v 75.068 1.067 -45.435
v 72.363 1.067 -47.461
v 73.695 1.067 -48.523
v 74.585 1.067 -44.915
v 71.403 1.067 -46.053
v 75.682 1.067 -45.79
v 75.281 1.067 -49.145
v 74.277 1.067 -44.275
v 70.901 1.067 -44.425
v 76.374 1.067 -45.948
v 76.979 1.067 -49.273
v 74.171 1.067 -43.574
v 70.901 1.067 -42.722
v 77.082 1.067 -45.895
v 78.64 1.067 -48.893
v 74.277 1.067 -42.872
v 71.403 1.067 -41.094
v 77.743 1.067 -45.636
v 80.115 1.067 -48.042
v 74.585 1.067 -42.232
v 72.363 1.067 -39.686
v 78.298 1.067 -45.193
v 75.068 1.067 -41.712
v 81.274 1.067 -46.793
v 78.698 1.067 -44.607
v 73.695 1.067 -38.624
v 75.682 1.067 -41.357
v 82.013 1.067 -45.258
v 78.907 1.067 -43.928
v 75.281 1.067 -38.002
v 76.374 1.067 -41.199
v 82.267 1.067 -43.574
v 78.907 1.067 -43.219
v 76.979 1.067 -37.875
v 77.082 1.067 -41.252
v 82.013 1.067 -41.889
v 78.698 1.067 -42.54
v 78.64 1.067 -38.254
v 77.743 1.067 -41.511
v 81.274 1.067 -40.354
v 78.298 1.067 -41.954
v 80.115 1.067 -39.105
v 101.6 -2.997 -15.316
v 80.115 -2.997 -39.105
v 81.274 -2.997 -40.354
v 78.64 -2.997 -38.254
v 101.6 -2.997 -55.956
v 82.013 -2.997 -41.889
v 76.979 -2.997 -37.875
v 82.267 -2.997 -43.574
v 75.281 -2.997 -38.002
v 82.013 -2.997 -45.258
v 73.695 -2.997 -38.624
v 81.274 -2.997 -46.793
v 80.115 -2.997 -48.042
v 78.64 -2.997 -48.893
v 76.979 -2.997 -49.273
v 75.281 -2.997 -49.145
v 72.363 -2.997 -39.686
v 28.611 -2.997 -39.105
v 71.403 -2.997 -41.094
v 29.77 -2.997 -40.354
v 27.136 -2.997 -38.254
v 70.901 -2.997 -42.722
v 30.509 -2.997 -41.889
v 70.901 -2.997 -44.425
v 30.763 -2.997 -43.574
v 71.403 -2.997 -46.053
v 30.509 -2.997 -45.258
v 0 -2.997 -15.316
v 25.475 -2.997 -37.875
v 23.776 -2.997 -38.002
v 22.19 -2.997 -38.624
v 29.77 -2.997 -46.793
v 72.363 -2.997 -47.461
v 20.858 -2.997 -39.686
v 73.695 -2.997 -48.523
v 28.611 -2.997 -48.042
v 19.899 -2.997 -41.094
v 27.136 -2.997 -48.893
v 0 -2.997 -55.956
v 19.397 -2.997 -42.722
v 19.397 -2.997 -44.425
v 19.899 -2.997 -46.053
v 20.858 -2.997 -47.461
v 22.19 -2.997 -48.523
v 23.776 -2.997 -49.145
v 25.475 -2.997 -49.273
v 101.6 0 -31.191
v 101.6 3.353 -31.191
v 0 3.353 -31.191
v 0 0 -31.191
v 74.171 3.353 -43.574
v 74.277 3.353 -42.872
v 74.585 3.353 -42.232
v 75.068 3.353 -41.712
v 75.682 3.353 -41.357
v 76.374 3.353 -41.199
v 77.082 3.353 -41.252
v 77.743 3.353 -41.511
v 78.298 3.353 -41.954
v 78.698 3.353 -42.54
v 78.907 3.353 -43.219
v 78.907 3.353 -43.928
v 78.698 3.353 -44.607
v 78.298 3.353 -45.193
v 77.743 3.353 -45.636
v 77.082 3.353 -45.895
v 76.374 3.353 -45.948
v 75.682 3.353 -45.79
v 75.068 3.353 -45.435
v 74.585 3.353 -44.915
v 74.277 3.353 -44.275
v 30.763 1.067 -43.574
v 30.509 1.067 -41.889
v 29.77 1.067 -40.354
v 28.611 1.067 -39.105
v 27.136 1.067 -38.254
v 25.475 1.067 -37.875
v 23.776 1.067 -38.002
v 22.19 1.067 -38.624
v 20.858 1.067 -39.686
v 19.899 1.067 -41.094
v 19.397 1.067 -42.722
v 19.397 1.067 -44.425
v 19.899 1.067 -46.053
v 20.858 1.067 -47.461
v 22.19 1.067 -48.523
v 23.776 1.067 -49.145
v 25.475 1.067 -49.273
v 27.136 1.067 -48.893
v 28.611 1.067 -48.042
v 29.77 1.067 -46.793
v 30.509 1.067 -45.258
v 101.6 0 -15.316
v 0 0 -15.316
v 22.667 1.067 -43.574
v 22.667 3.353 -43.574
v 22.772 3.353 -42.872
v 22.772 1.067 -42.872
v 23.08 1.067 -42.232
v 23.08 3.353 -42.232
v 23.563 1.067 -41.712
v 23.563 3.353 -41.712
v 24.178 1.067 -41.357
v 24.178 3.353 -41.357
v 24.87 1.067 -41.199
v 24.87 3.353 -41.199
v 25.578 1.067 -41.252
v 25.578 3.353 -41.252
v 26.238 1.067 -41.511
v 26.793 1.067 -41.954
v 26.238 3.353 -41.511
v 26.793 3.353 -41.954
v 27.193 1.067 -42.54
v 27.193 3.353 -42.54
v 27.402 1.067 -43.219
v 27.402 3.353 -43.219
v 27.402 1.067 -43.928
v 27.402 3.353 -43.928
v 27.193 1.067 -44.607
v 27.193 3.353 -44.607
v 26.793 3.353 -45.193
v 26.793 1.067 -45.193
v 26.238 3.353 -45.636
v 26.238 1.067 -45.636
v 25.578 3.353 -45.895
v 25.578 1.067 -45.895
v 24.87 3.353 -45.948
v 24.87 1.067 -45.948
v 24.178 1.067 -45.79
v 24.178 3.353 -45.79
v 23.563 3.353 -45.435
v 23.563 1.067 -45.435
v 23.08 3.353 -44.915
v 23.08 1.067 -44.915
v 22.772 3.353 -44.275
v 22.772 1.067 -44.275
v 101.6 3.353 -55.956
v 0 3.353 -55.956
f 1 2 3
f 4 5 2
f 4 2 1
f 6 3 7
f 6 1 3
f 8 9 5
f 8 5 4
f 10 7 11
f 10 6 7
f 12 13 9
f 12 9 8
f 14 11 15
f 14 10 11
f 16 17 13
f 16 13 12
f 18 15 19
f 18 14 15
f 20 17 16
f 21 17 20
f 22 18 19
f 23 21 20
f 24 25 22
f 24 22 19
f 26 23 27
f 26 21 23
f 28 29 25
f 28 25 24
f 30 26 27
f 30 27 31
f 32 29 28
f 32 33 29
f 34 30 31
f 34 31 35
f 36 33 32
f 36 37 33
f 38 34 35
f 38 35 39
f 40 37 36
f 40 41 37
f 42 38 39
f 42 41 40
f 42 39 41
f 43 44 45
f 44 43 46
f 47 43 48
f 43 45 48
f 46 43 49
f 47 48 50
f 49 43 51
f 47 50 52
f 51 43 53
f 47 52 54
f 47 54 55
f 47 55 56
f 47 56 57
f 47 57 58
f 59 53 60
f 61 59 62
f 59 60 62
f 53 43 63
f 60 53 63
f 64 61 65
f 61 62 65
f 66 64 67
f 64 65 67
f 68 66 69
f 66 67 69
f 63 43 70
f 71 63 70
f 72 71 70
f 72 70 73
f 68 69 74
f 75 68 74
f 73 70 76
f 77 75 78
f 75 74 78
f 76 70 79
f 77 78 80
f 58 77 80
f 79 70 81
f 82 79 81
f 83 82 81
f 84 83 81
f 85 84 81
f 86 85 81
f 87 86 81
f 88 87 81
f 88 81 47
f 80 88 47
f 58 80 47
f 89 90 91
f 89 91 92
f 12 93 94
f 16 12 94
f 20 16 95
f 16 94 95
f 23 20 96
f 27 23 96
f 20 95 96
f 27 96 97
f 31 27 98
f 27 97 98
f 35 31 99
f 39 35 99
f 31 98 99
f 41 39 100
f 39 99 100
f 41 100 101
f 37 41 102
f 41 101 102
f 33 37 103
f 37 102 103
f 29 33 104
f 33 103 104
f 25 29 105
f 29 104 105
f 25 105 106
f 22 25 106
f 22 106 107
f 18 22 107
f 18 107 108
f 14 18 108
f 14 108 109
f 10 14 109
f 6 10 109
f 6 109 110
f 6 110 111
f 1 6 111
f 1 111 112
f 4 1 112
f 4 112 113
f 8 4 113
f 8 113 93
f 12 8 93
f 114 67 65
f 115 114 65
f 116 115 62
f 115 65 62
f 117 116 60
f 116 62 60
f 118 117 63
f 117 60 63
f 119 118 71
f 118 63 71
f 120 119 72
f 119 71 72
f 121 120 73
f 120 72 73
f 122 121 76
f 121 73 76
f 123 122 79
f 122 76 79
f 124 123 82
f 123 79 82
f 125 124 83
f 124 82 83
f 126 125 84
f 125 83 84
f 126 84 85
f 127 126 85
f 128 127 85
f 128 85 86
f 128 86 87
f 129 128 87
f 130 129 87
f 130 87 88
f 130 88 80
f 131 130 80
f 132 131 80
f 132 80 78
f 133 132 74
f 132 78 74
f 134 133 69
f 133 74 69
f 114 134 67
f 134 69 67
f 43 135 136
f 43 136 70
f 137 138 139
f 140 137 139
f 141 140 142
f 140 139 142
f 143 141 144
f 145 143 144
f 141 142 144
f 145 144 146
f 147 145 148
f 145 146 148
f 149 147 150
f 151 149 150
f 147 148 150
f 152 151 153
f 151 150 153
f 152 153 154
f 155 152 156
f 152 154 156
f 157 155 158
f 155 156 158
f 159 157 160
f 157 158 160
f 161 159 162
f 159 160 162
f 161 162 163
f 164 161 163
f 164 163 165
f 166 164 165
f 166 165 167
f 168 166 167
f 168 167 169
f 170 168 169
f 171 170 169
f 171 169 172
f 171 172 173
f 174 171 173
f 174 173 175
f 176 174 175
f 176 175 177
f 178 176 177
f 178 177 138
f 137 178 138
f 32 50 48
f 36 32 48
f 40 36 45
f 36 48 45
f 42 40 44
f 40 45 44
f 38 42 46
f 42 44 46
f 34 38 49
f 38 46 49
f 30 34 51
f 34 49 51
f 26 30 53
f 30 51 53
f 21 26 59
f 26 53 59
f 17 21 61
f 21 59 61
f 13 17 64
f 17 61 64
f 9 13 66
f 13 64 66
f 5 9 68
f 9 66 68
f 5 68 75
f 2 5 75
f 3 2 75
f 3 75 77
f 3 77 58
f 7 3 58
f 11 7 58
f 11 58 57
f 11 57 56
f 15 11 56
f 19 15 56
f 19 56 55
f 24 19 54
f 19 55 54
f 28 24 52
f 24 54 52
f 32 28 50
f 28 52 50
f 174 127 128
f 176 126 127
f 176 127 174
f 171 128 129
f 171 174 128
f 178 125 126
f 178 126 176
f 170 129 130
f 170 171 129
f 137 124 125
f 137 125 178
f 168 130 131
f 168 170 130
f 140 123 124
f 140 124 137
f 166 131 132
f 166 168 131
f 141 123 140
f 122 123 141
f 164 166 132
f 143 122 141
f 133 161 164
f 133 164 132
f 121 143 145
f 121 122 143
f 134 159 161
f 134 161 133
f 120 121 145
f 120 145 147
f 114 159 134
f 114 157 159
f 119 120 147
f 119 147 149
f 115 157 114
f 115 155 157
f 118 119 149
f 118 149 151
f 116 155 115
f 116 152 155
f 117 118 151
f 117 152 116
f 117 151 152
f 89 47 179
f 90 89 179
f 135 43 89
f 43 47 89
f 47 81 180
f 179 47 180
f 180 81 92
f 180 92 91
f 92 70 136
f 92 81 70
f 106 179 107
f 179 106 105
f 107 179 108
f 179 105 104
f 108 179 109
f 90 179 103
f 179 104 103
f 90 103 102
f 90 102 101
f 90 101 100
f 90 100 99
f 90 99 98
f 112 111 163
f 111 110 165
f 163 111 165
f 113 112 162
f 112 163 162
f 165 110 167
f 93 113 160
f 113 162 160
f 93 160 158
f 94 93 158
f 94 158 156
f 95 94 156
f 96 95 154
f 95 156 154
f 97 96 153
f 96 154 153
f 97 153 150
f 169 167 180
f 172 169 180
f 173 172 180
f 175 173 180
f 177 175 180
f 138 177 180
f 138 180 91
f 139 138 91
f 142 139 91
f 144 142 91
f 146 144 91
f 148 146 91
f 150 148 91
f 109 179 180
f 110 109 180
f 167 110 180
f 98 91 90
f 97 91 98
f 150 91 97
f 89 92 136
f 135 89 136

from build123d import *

# Parameters (mm, degrees)
F1_DEPTH = 101.6
F2_R     = 2.38125
F3_DEPTH = 6.35
F4_R     = 5.715
F5_DEPTH = 4.064


with BuildPart() as f1:
    # F0 (on Right) → F1 (new body)
    with BuildSketch(Plane.YZ):
        Polygon((0, -31.19104), (0, -15.31604), (-2.9972, -15.31604), (-2.9972, -55.95604), (3.3528, -55.95604), (3.3528, -31.19104), align=None)
    extrude(amount=F1_DEPTH)

    # F2 (on face) → F3 (cut, through all)
    with BuildSketch(Plane(origin=(0, 3.3528, 0), x_dir=(-1, 0, 0), z_dir=(0, 1, 0))):
        with Locations((-76.552249, -43.57354)):
            Circle(F2_R)
        with Locations((-25.047751, -43.57354)):
            Circle(F2_R)
    extrude(amount=-F3_DEPTH, mode=Mode.SUBTRACT)

    # F4 (on face) → F5 (cut)
    with BuildSketch(Plane.XZ.offset(2.9972)):
        with Locations((25.047751, -43.57354)):
            Circle(F4_R)
        with Locations((76.552249, -43.57354)):
            Circle(F4_R)
    extrude(amount=-F5_DEPTH, mode=Mode.SUBTRACT)


solid = f1.part
